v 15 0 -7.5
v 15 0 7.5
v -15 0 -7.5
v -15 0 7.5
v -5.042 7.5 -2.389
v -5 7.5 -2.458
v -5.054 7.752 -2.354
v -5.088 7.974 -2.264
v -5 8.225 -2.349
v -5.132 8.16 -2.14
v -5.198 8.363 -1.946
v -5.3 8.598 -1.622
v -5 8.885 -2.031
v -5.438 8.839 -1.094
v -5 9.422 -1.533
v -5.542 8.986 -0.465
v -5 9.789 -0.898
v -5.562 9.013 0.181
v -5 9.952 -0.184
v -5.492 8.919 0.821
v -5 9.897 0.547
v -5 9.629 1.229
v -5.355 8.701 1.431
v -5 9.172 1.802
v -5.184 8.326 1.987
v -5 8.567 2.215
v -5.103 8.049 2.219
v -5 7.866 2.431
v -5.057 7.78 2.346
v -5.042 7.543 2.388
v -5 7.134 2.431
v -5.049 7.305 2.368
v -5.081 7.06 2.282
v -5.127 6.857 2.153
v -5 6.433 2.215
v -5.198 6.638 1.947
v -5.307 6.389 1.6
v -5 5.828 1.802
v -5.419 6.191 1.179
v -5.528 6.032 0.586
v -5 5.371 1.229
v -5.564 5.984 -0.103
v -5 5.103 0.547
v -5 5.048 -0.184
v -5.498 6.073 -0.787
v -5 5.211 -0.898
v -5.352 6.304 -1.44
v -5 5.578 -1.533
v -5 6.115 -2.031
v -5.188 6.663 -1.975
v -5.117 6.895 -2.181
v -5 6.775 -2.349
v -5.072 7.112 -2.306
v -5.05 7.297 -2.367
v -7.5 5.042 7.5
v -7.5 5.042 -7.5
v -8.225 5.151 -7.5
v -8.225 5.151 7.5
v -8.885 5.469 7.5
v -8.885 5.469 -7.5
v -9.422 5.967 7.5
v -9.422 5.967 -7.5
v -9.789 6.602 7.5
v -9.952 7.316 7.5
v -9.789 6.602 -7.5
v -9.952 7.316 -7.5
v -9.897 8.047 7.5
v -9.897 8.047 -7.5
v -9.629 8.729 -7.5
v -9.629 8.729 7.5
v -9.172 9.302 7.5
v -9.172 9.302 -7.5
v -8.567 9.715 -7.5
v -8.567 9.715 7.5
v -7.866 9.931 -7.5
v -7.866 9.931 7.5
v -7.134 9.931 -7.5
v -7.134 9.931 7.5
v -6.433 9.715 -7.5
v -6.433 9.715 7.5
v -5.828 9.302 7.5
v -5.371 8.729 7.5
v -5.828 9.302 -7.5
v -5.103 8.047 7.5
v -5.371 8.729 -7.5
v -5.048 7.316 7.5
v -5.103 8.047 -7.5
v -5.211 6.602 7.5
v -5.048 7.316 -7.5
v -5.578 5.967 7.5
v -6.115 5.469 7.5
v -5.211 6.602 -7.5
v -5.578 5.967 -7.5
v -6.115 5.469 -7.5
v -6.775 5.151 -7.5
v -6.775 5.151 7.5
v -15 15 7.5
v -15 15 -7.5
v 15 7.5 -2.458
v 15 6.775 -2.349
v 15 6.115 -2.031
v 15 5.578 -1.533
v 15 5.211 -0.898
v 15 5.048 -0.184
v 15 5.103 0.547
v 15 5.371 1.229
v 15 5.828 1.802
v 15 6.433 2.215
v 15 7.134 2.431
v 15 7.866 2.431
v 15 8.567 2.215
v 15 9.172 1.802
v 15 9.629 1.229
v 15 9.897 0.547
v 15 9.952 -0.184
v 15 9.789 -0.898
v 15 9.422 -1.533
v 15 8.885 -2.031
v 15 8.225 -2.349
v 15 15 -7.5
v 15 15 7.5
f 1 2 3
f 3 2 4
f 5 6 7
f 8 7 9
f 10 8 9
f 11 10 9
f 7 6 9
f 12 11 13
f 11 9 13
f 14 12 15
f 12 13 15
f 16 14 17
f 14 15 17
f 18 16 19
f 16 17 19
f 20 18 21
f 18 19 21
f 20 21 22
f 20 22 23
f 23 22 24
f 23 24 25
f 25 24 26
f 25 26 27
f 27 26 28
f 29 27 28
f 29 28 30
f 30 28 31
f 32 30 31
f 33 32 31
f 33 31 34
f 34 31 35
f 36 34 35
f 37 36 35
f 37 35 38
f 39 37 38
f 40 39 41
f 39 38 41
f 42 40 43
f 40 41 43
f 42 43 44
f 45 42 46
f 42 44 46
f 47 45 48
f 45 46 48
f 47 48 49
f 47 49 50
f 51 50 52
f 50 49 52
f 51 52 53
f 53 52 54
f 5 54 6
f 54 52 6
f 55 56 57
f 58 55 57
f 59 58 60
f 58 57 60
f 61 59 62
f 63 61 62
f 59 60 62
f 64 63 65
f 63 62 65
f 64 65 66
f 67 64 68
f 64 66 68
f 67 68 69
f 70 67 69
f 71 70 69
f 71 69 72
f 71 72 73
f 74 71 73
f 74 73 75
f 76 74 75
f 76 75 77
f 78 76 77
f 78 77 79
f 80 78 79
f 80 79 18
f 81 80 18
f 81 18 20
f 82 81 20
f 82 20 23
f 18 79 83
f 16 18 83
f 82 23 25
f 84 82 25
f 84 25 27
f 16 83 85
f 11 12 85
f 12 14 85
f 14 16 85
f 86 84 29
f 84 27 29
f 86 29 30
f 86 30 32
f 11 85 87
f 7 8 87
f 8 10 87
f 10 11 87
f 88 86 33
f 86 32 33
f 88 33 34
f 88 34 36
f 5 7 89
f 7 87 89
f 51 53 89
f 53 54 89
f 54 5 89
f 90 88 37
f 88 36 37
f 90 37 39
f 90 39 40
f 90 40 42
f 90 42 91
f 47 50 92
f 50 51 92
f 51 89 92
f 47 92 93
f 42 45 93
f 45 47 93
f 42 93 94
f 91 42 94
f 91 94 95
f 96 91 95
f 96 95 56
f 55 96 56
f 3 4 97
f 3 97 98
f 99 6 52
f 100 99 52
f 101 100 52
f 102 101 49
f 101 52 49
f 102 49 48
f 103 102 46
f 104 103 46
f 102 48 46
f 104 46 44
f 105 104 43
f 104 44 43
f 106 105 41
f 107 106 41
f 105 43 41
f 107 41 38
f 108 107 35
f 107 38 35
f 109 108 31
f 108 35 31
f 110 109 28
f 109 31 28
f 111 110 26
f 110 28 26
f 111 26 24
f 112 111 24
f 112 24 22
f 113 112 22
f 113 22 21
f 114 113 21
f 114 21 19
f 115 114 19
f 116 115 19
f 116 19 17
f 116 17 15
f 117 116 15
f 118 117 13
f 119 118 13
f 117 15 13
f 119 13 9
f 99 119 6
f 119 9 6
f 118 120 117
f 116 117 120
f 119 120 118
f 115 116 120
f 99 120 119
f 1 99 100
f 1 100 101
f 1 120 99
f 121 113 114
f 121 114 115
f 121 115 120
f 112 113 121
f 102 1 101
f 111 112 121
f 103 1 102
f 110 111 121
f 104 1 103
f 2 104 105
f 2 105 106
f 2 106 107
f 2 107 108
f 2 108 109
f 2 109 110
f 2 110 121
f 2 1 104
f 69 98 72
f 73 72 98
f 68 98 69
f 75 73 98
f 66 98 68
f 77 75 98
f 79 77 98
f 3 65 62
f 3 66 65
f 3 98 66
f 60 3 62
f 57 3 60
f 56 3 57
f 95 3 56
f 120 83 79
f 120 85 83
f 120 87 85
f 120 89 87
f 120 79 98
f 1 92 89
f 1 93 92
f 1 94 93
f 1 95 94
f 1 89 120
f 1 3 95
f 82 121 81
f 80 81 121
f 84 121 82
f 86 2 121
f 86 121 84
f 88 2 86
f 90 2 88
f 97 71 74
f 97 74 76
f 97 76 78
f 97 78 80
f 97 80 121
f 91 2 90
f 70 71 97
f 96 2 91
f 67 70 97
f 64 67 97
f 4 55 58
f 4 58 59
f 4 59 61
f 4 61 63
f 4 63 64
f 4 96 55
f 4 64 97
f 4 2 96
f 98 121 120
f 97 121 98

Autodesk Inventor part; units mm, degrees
ref_plane "YZ Plane" through (0, 0, 0) normal (1, 0, 0) x (0, 1, 0)
ref_plane "XZ Plane" through (0, 0, 0) normal (0, 1, 0) x (-1, 0, 0)
ref_plane "XY Plane" through (0, 0, 0) normal (0, 0, 1) x (1, 0, 0)
sketch "Skizze1" plane through (0, 0, 0) normal (0, 1, 0) x (-1, 0, 0)
  line L0 (15, -7.5) -> (-15, -7.5)
  line L1 (-15, -7.5) -> (-15, 7.5)
  line L2 (-15, 7.5) -> (15, 7.5)
  line L3 (15, 7.5) -> (15, -7.5)
  line L4 (15, -7.5) -> (-15, 7.5) construction
  line L5 (-15, -7.5) -> (15, 7.5) construction
  point P0 (0, 0)
  dimension "d0" = 15
  dimension "d1" = 30
extrude "Extrusion1" add sketch "Skizze1" along normal blind 15
sketch "Skizze2" plane through (15, 0, 7.5) normal (1, 0, 0) x (0, 0, -1)
  circle A0 centre (7.5, 7.5) radius 4
  line L0 (0, 0) -> (0, 15) projected
  point P0 (7.5, 0)
  dimension "d4" = 7.5
  dimension "d5" = 8
  dimension "d47" = 7.5
hole "Bohrung1" at (15, 7.5, 0) direction (-1, 0, 0) diameter 4.917 depth 20 tip angle 118 thread size "M6x1" class "6H" standard "ISO Metric profile"
sketch "Skizze4" plane through (-15, 0, 7.5) normal (0, 0, 1) x (1, 0, 0)
  circle A0 centre (7.5, 7.5) radius 2.1663
  line L0 (30, 0) -> (0, 0) projected
  line L1 (0, 0) -> (0, 15) projected
  circle A1 centre (22, 15) radius 3.1386
  line L2 (30, 0) -> (30, 15) projected
  point P0 (15, 0)
  dimension "d27" = 7.5
  dimension "d28" = 7.5
  dimension "d29" = 15
  dimension "d30" = 8
hole "Bohrung3" at (-7.5, 7.5, 7.5) direction (0, 0, -1) diameter 4.917 depth 15 tip angle 118 thread size "M6x1" class "6H" standard "ISO Metric profile"
properties part number "alublock" material "Kupfer"
